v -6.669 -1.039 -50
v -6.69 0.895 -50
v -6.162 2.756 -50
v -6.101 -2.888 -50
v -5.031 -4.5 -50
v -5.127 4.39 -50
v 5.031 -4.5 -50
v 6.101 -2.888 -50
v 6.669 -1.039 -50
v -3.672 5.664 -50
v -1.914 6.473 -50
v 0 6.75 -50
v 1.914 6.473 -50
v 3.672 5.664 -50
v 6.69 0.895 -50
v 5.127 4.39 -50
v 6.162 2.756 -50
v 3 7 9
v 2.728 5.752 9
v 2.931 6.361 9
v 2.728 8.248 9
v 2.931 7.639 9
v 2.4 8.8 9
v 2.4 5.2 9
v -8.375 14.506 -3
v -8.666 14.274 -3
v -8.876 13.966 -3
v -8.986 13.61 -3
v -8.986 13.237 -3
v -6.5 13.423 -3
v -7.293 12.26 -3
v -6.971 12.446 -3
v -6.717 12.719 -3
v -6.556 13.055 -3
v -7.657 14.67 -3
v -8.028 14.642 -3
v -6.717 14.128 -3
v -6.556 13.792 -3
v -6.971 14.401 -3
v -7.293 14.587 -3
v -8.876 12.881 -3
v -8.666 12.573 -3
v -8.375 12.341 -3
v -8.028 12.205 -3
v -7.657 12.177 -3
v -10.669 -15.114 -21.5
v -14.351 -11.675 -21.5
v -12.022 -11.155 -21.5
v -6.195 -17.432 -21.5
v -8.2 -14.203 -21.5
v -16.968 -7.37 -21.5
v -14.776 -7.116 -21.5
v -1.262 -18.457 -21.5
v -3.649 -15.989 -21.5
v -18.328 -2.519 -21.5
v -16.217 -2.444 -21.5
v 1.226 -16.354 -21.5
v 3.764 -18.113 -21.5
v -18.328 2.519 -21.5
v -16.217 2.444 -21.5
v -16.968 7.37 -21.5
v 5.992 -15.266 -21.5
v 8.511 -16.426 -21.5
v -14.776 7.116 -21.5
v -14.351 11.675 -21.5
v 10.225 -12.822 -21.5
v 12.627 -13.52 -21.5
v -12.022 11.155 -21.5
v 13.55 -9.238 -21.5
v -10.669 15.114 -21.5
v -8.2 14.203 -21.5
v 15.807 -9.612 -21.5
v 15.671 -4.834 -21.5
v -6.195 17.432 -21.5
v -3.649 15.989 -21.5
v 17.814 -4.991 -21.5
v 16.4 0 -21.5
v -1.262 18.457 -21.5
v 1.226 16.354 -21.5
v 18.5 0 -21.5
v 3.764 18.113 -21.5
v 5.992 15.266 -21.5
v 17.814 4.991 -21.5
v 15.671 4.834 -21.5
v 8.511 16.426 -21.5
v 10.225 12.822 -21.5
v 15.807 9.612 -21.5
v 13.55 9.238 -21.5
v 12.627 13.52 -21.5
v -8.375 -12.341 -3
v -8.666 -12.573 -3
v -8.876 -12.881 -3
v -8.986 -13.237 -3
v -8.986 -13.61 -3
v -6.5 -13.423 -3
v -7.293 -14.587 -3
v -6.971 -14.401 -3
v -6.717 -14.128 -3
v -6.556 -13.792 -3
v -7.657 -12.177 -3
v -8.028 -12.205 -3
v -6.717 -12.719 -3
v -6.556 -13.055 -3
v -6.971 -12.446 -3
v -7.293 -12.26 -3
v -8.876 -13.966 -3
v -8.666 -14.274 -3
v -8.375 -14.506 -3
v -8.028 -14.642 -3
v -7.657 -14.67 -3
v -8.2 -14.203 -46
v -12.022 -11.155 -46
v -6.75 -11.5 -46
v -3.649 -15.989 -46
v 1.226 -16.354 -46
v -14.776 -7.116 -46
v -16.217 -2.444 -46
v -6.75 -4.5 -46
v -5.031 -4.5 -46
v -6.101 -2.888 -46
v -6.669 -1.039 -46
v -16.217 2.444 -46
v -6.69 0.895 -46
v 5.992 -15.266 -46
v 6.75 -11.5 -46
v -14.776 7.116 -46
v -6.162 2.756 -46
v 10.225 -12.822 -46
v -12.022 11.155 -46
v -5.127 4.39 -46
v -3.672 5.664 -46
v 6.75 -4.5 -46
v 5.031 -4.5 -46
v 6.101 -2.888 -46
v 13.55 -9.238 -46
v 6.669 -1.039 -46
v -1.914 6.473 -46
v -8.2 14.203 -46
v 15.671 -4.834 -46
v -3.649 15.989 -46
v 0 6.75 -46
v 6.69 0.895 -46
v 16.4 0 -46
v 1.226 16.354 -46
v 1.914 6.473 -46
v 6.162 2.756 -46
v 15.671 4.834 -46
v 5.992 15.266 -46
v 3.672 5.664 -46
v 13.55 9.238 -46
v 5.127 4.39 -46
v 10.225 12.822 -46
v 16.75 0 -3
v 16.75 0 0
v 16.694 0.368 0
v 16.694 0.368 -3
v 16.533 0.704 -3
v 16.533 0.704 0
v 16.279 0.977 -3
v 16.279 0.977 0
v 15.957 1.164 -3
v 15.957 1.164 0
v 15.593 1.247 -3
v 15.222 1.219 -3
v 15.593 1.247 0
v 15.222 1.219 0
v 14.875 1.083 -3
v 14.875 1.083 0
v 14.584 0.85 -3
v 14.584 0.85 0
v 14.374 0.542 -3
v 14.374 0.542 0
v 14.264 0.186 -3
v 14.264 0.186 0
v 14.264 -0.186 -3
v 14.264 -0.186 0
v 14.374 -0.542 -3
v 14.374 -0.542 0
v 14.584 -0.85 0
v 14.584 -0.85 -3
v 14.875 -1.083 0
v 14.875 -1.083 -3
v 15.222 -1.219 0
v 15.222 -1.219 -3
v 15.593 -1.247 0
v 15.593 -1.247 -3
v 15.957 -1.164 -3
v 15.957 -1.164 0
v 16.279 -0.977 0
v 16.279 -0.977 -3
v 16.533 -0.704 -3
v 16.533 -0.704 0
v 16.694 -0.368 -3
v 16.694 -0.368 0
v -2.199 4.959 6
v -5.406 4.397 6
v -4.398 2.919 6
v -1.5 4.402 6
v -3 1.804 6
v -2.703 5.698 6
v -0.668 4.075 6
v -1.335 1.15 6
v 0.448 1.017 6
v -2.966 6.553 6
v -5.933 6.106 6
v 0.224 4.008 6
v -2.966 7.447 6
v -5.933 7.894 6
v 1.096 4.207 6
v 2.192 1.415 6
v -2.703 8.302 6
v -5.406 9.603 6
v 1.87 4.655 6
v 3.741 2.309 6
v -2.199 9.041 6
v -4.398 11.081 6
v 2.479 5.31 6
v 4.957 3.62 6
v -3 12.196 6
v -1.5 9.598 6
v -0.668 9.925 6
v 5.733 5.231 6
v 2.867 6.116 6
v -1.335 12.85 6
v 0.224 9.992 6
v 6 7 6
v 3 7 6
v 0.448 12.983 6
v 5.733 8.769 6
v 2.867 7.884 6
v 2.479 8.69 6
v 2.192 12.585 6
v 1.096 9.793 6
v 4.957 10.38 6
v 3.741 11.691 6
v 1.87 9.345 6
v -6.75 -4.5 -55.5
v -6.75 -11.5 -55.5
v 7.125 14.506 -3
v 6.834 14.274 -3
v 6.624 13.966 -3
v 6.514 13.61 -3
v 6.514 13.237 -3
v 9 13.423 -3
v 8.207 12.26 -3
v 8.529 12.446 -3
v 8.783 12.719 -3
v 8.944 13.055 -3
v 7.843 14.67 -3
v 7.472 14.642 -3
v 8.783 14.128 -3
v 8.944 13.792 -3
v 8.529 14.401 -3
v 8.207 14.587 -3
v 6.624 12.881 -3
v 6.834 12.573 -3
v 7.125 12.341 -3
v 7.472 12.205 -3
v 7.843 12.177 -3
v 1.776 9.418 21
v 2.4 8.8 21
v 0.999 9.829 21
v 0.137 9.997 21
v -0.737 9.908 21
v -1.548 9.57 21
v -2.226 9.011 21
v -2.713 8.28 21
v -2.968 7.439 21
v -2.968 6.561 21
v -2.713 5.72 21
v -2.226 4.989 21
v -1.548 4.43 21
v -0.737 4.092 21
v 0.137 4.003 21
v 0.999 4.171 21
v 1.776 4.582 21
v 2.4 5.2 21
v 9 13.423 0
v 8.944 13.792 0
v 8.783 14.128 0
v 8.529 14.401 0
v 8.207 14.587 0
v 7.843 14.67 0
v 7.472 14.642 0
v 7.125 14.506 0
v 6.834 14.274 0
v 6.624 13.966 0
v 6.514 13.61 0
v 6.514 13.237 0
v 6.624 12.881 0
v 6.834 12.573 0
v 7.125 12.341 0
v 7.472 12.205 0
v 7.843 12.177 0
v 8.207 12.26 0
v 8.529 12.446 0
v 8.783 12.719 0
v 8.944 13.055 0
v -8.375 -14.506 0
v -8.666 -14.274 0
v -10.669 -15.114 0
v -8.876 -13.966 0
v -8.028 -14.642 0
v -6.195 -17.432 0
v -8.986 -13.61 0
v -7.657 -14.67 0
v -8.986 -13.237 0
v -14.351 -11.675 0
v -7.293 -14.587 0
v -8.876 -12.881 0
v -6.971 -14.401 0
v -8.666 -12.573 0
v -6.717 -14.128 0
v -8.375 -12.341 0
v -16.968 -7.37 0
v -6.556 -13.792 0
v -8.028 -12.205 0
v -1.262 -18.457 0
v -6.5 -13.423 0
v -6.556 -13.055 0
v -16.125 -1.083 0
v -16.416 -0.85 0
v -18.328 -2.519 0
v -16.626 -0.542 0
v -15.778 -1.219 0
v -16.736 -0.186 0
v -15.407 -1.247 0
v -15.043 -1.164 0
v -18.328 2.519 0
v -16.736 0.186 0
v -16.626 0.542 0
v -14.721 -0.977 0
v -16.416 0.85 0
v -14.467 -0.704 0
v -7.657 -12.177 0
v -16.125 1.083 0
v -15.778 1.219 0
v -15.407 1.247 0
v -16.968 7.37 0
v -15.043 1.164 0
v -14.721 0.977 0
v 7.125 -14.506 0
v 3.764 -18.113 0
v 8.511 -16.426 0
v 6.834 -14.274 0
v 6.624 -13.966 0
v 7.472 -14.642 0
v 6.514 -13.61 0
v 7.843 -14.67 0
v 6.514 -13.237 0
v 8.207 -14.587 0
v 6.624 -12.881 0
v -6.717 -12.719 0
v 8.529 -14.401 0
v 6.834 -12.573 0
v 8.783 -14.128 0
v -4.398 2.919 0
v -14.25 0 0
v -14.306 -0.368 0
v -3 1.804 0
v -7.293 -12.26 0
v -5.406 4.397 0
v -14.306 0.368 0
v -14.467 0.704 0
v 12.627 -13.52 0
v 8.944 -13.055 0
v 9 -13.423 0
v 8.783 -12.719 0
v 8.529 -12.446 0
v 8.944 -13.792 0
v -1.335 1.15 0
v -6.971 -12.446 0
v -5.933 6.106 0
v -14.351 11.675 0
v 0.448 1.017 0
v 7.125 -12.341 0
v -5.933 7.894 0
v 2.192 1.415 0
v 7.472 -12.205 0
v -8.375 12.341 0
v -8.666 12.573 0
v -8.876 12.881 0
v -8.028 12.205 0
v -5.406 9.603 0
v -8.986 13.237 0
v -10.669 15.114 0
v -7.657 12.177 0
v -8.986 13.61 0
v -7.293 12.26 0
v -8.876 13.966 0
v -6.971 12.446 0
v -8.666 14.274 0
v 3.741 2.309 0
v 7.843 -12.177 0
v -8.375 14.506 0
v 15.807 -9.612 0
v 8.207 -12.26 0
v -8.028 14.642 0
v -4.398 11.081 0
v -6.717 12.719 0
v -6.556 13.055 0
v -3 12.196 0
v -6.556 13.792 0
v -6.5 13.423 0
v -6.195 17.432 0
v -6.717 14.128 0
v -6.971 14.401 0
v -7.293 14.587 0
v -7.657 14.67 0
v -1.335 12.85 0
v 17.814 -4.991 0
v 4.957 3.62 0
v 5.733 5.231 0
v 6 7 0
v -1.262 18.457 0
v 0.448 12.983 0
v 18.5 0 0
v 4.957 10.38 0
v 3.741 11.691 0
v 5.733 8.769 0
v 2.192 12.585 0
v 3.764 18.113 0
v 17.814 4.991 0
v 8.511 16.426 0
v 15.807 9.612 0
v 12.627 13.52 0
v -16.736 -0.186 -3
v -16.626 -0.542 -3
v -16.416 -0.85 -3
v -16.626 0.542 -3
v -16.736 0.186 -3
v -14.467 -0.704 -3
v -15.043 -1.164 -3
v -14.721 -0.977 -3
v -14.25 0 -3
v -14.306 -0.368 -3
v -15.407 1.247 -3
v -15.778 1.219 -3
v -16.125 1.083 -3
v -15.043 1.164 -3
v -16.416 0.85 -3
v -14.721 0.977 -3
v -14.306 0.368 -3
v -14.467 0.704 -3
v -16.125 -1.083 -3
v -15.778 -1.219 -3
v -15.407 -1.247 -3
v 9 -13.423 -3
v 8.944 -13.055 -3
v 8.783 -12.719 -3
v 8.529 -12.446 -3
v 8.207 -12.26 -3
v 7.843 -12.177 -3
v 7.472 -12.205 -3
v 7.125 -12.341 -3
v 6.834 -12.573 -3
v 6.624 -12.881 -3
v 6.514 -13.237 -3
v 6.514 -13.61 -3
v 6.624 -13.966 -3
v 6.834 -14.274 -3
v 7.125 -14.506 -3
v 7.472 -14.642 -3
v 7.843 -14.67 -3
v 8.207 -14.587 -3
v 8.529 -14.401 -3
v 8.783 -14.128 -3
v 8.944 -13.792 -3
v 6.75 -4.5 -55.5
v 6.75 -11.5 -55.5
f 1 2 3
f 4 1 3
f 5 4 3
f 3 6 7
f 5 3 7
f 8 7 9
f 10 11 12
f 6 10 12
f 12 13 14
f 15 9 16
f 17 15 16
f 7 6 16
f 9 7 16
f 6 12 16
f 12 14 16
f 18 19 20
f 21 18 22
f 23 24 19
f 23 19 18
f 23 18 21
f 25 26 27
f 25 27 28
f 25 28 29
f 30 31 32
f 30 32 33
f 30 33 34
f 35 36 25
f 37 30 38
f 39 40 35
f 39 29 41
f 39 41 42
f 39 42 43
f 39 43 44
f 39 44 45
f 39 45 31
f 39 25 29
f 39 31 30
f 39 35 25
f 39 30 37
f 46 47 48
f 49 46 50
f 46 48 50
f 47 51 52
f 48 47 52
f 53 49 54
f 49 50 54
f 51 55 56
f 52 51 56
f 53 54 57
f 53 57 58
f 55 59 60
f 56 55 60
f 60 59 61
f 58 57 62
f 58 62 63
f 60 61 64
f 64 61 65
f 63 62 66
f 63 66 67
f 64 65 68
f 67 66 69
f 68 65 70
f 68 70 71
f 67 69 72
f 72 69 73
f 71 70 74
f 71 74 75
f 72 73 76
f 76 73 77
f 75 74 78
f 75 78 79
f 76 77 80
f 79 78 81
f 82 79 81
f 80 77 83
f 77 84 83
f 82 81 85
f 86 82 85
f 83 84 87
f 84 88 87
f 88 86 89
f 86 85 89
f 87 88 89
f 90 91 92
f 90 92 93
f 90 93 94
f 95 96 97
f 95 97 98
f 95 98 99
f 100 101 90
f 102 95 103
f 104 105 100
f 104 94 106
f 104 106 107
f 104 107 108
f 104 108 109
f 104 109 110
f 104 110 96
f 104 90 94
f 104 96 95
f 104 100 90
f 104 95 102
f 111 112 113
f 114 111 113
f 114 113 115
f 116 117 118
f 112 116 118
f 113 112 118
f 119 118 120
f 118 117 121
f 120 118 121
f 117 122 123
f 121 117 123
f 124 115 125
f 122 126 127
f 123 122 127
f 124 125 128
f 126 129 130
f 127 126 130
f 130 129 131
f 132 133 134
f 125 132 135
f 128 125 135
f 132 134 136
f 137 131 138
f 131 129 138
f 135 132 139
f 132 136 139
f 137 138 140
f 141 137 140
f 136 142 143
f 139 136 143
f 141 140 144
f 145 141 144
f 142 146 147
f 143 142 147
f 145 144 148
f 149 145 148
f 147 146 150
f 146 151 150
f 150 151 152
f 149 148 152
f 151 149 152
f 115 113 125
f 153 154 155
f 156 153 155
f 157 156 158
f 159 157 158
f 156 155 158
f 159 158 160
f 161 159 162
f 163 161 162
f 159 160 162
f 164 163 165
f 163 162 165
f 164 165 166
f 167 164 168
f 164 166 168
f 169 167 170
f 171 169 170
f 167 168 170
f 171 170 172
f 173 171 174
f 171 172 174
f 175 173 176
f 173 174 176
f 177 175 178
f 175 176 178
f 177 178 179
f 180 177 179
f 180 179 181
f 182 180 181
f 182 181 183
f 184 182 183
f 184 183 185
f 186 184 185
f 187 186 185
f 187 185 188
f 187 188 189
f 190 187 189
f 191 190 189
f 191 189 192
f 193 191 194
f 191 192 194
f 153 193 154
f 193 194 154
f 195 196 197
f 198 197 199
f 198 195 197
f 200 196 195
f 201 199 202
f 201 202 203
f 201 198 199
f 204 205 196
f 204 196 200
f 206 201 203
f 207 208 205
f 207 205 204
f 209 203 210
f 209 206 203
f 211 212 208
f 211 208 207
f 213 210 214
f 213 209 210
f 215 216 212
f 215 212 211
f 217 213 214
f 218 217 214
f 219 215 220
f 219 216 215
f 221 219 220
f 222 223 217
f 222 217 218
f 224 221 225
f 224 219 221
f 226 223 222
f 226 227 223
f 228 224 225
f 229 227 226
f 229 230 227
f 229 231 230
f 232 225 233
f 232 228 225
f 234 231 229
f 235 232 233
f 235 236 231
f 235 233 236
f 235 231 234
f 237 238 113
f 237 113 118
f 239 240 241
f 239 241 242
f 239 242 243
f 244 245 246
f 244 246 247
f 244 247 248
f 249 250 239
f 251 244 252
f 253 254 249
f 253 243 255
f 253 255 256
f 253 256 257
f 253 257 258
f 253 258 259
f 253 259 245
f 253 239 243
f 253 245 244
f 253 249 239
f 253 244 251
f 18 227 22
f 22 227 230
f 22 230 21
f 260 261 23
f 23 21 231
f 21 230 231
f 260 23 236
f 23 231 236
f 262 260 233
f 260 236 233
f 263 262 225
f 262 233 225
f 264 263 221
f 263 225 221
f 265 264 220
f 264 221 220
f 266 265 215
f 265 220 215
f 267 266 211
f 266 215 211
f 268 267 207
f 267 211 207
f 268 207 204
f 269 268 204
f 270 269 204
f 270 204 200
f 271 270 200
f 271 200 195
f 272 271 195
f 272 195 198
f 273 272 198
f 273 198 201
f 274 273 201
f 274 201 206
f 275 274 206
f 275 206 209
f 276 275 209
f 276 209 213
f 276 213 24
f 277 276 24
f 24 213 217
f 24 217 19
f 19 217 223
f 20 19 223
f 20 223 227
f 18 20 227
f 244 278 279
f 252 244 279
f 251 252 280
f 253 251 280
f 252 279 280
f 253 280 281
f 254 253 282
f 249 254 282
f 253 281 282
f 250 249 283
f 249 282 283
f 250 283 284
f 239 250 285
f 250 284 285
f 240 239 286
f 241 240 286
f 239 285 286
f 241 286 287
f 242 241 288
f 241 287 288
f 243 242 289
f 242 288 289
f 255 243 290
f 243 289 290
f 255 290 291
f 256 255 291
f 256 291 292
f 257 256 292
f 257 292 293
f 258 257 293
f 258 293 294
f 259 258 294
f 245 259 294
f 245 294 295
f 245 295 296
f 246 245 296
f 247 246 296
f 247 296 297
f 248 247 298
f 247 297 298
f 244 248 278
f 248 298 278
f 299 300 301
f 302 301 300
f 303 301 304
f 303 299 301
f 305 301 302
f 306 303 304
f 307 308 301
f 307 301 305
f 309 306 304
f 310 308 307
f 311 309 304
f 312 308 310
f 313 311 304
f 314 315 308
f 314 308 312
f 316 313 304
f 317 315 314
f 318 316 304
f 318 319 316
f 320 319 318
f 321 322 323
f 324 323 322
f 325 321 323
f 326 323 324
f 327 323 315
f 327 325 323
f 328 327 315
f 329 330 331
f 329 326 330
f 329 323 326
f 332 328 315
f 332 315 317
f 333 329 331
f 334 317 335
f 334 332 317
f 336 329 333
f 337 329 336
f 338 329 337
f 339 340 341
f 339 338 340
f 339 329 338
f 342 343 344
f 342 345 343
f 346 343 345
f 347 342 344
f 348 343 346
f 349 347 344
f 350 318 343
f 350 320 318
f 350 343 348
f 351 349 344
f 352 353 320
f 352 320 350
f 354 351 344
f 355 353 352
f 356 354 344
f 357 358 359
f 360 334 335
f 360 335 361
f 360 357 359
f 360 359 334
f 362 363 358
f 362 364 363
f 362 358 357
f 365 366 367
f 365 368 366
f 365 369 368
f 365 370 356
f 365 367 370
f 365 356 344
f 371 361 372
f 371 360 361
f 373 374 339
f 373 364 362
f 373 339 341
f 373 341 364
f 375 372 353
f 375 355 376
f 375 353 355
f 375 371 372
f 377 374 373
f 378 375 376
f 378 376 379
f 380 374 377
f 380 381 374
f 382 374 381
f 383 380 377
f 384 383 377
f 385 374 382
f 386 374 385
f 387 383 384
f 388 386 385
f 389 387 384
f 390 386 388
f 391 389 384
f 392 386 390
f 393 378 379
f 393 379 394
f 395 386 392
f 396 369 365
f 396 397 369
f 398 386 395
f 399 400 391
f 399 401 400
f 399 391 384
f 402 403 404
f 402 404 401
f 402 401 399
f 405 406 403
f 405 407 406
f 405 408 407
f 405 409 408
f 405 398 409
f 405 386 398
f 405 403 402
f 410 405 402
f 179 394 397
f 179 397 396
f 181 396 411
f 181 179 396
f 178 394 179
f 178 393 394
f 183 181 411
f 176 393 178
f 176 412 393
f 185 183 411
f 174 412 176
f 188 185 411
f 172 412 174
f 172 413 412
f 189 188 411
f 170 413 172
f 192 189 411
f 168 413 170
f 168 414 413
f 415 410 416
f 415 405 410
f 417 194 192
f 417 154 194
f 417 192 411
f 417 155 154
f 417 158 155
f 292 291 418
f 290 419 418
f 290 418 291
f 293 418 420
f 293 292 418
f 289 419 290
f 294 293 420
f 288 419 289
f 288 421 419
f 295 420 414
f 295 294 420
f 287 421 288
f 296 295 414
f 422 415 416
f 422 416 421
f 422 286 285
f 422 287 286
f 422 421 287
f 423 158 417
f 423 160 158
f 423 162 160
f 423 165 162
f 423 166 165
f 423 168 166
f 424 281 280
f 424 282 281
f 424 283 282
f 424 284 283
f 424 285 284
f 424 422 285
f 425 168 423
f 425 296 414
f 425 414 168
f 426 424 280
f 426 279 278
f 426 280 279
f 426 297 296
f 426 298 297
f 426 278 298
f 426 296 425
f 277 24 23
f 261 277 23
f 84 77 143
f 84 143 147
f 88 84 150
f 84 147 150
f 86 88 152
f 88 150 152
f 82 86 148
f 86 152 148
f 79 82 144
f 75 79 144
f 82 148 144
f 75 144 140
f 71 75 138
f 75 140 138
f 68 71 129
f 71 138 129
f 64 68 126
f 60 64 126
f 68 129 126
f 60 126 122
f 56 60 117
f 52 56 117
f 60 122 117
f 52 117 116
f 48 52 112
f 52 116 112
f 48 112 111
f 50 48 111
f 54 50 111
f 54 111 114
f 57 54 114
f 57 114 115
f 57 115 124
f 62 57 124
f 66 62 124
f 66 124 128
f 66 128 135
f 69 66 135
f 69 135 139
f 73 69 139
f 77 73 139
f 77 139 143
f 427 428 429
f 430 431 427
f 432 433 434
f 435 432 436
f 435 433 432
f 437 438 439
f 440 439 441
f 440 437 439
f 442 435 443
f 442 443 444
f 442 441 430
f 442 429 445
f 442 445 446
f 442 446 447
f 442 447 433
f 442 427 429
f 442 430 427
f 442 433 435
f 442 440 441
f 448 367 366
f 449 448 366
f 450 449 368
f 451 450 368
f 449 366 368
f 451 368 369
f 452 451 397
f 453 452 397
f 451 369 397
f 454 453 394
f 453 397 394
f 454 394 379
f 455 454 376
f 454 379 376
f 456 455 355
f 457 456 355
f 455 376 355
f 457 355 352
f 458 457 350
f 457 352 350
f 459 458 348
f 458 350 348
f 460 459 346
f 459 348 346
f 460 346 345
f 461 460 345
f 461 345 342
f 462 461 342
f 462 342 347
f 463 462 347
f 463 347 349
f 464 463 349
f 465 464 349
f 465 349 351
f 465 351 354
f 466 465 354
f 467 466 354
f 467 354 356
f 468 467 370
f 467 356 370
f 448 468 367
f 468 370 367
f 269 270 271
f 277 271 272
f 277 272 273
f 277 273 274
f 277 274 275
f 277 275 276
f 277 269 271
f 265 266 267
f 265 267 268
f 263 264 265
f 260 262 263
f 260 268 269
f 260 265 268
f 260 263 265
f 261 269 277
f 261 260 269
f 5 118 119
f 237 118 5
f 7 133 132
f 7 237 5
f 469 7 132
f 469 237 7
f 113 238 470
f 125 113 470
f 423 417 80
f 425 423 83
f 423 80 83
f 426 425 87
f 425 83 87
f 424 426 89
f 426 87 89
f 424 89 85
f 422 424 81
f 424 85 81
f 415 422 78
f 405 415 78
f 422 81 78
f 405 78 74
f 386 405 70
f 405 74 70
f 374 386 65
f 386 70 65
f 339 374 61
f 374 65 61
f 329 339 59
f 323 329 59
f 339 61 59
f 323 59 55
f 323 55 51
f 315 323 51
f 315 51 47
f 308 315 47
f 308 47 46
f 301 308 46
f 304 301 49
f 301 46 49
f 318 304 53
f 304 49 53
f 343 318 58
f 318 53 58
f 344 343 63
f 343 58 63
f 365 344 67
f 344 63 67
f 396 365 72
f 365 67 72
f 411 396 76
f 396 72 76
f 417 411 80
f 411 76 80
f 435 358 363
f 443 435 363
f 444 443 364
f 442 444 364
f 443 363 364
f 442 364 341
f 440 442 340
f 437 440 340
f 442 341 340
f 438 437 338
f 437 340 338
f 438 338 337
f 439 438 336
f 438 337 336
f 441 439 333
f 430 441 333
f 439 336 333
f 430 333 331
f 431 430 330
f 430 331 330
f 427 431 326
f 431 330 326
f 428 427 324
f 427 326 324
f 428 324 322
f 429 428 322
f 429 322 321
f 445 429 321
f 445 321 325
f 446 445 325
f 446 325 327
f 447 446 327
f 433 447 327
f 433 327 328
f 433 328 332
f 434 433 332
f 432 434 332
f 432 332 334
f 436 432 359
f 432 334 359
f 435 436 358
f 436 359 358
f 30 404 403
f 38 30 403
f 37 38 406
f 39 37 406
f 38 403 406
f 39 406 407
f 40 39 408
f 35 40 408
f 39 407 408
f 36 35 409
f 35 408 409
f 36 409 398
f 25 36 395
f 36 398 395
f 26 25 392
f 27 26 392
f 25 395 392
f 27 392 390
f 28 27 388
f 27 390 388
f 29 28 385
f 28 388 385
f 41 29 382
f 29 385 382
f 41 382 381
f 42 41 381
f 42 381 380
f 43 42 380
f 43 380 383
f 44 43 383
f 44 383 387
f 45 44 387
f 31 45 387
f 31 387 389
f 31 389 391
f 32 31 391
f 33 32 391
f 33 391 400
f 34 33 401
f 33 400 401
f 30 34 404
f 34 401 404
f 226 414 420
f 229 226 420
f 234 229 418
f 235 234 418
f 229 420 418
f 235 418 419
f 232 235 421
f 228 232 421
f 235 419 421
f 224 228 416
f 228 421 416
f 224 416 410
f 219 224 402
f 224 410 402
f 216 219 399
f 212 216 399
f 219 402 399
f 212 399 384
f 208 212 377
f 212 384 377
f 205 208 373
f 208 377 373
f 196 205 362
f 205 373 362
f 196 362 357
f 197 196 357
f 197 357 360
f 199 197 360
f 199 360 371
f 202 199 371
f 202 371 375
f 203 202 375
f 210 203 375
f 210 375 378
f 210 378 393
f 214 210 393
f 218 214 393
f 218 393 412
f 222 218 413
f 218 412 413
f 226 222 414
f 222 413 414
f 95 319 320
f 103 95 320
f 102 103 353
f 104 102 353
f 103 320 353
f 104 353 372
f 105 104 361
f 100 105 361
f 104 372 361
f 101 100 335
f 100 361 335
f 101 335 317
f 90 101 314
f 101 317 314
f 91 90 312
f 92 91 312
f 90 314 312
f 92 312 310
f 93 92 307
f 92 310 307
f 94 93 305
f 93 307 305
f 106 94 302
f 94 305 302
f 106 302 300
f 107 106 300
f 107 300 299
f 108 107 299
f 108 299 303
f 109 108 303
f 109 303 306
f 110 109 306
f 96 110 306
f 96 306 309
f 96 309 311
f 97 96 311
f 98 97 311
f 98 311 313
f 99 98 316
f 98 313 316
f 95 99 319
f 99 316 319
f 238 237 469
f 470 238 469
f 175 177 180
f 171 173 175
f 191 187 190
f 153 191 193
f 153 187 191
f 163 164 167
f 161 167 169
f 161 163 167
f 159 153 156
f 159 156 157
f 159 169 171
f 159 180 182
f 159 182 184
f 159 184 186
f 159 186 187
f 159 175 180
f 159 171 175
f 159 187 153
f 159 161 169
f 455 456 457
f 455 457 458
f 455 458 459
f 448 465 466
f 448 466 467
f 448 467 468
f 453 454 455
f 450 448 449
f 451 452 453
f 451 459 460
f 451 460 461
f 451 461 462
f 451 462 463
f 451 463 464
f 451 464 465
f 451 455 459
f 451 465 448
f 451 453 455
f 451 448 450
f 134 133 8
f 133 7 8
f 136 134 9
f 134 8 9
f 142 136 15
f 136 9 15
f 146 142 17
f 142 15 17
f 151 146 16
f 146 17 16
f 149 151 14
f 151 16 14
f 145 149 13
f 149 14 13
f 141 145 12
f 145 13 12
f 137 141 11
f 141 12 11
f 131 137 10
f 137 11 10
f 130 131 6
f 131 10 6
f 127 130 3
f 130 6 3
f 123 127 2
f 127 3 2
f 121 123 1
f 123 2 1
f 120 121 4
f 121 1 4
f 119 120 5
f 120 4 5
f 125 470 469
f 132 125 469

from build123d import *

# Parameters (mm, degrees)
EXTRUDE_START          = -21.5
SKETCH_1_R             = 18.5
EXTRUDE_37_21_5_DEPTH  = 21.5
EXTRUDE_START_2        = -44.5
SKETCH_2_R             = 16.4
EXTRUDE_32_8_23_DEPTH  = 23
PCB_START              = -46
SKETCH_3_R             = 16.4
PCB_DEPTH              = 1.5
EXTRUDE_START_3        = -50
SKETCH_4_R             = 6.75
EXTRUDE_504_DEPTH      = 4
XH2_54_START           = -55.5
SKETCH_5_W             = 13.5
SKETCH_5_H             = 7
XH2_54_DEPTH           = 9.5
SKETCH_6_R             = 6
F_7MM_12_DEPTH         = 6
EXTRUDE_START_4        = 6
SKETCH_7_R             = 3
EXTRUDE_6_DEPTH        = 3
EXTRUDE_START_5        = 9
EXTRUDE_D_5_4_12_DEPTH = 12
SKETCH_9_R             = 1.25
F_6XM3_3_DEPTH         = 3


with BuildPart() as part:
    # 草图1 → 减速箱_直径37_长21.5 (new body)
    with BuildSketch(Plane.XY.offset(EXTRUDE_START)):
        Circle(SKETCH_1_R)
    extrude(amount=EXTRUDE_37_21_5_DEPTH)

    # 草图2 → 电机壳_直径32.8_长23 (add)
    with BuildSketch(Plane.XY.offset(EXTRUDE_START_2)):
        Circle(SKETCH_2_R)
    extrude(amount=EXTRUDE_32_8_23_DEPTH)

    # 草图3 → 编码器PCB (add)
    with BuildSketch(Plane.XY.offset(PCB_START)):
        Circle(SKETCH_3_R)
    extrude(amount=PCB_DEPTH)

    # 草图4 → Extrude 504 (add)
    with BuildSketch(Plane.XY.offset(EXTRUDE_START_3)):
        Circle(SKETCH_4_R)
    extrude(amount=EXTRUDE_504_DEPTH)

    # 草图5 → XH2.54连接器_外形简化 (add)
    with BuildSketch(Plane.XY.offset(XH2_54_START)):
        with Locations((0, -8)):
            Rectangle(SKETCH_5_W, SKETCH_5_H)
    extrude(amount=XH2_54_DEPTH)

    # 草图6 → 偏心7mm_轴台直径12 (add)
    with BuildSketch(Plane.XY):
        with Locations((0, 7)):
            Circle(SKETCH_6_R)
    extrude(amount=F_7MM_12_DEPTH)

    # 草图7 → 输出轴直径6 (add)
    with BuildSketch(Plane.XY.offset(EXTRUDE_START_4)):
        with Locations((0, 7)):
            Circle(SKETCH_7_R)
    extrude(amount=EXTRUDE_6_DEPTH)

    # 草图8 → D轴_5.4对边_削平长12 (add)
    with BuildSketch(Plane.XY.offset(EXTRUDE_START_5)):
        with BuildLine():
            Line((2.4, 5.2), (2.4, 8.8))
            ThreePointArc((2.4, 8.8), (-3, 7), (2.4, 5.2))
        make_face()
    extrude(amount=EXTRUDE_D_5_4_12_DEPTH)

    # 草图9 → 6xM3安装底孔_深3_牙型简化 (cut)
    with BuildSketch(Plane.XY):
        with Locations((15.5, 0)):
            Circle(SKETCH_9_R)
        with Locations((7.75, 13.423393759)):
            Circle(SKETCH_9_R)
        with Locations((-7.75, 13.423393759)):
            Circle(SKETCH_9_R)
        with Locations((-15.5, 0)):
            Circle(SKETCH_9_R)
        with Locations((-7.75, -13.423393759)):
            Circle(SKETCH_9_R)
        with Locations((7.75, -13.423393759)):
            Circle(SKETCH_9_R)
    extrude(amount=-F_6XM3_3_DEPTH, mode=Mode.SUBTRACT)


solid = part.part
